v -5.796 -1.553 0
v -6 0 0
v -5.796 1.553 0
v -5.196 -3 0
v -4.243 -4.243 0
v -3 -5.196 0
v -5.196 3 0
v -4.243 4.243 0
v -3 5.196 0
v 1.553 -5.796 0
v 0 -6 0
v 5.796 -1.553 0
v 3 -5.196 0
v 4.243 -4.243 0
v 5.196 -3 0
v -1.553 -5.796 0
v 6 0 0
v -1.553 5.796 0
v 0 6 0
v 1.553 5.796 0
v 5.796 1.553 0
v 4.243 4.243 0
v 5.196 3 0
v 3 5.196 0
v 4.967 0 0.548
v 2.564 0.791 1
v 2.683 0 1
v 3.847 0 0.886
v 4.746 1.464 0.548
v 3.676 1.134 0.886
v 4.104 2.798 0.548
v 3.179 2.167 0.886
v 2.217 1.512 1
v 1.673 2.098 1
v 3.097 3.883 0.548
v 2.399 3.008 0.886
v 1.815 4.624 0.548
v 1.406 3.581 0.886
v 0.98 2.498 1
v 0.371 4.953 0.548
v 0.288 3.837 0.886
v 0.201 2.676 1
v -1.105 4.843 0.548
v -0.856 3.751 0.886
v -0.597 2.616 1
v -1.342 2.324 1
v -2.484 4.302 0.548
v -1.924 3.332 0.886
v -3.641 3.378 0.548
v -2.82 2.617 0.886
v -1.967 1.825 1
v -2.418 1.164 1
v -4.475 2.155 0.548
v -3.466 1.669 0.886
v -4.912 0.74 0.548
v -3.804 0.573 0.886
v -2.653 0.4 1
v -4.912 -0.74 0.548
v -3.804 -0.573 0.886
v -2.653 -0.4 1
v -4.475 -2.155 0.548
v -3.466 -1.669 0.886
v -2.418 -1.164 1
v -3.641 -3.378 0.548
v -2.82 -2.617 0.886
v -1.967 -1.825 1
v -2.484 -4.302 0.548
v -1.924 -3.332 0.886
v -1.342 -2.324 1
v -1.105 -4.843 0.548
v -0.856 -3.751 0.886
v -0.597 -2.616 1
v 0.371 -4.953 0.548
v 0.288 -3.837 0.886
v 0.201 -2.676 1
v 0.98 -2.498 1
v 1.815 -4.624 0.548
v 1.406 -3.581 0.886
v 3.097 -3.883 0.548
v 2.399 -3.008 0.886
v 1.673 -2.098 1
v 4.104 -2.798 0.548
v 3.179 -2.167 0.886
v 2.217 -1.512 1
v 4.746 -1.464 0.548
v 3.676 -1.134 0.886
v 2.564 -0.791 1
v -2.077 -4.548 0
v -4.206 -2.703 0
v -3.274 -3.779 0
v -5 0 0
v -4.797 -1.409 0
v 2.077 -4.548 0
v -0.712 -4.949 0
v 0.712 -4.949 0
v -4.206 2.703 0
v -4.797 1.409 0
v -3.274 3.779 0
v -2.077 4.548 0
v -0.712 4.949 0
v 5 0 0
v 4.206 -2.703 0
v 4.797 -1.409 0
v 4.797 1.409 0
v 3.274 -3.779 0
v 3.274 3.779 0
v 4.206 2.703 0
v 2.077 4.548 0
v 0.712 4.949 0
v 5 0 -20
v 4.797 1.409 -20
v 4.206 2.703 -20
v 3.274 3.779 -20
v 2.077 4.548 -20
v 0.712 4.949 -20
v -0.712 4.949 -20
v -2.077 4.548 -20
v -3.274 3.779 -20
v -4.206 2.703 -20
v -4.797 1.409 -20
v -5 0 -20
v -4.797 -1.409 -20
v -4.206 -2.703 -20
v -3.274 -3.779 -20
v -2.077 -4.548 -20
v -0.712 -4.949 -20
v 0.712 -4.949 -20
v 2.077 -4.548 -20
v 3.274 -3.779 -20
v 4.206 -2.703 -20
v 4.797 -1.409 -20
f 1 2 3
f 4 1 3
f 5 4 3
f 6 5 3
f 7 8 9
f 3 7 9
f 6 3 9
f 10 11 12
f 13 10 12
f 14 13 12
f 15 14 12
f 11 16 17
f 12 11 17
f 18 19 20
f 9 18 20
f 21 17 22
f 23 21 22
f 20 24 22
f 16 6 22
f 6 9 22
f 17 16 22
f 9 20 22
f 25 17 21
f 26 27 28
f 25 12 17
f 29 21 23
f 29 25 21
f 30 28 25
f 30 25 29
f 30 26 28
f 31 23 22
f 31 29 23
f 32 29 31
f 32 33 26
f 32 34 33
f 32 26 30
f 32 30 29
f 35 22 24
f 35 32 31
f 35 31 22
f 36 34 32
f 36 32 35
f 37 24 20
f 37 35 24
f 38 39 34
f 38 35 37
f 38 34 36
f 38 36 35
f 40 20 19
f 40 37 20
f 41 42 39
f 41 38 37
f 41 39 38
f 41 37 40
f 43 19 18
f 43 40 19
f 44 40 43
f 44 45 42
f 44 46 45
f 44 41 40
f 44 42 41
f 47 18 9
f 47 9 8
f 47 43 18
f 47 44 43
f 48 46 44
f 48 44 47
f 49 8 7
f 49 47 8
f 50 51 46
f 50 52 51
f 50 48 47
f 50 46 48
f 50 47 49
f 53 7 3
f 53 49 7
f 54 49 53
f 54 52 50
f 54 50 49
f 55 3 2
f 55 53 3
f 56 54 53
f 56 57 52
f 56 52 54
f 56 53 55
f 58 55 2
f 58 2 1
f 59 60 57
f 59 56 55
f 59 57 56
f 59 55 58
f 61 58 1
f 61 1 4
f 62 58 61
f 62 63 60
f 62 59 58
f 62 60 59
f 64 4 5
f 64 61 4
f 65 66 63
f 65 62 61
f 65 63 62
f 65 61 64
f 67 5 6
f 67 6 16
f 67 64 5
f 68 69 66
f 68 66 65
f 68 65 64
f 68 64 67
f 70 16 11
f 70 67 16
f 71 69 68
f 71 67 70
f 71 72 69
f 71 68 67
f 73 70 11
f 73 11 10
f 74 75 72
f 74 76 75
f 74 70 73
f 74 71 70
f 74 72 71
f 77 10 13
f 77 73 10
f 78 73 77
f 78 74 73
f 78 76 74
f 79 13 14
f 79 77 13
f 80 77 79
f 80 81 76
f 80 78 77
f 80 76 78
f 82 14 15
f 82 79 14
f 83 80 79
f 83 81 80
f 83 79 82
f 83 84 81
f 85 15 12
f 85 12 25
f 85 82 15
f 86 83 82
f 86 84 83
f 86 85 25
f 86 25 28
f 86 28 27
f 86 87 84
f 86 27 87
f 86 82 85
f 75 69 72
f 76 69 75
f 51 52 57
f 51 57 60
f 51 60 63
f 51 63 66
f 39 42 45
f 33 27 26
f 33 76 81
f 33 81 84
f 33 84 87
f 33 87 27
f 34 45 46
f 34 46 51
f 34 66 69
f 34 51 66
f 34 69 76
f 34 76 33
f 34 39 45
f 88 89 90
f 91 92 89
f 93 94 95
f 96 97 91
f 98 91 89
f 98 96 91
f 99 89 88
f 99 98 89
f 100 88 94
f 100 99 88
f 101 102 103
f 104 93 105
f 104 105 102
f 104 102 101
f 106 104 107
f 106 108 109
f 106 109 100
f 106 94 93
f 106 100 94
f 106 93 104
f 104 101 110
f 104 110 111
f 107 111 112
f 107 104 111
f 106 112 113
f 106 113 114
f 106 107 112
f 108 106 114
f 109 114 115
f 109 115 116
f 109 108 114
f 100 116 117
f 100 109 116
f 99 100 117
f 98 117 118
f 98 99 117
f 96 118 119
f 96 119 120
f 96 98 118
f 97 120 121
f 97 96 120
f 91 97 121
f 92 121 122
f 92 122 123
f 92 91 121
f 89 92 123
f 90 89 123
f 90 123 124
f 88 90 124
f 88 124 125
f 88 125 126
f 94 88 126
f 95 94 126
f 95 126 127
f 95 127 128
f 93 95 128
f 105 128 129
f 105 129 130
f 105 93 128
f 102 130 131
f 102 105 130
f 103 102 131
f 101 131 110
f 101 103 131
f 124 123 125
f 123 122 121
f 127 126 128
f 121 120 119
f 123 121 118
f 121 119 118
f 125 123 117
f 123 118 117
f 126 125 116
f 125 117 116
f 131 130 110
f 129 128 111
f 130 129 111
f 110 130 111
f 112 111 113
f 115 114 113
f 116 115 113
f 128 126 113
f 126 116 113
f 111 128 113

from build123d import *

# Parameters (mm, degrees)
SKETCH1_R           = 5
BOSS_EXTRUDE2_DEPTH = 20
SKETCH1_4_R         = 6
BOSS_EXTRUDE3_DEPTH = 1
FILLET1_R           = 6


with BuildPart() as part:
    # Sketch1 → Boss-Extrude2 (new body)
    with BuildSketch(Plane.XY):
        Circle(SKETCH1_R)
    extrude(amount=-BOSS_EXTRUDE2_DEPTH)


with BuildPart() as body_2:
    # Sketch1<4> → Boss-Extrude3 (new body)
    with BuildSketch(Plane.XY):
        Circle(SKETCH1_4_R)
    extrude(amount=BOSS_EXTRUDE3_DEPTH)

    # Fillet1
    # the kernel refuses this fillet: 6 mm, written as the material it takes off along each edge
    with BuildSketch(Plane(origin=(0, 0, 1), x_dir=(1, 0, 0), z_dir=(0, -1, 0))) as fillet1_piece_1:
        with BuildLine():
            CenterArc((2.68337521, -6), FILLET1_R, 56.442690238, 33.557309762)
            Line((2.68337521, 0), (2.68337521, 0.12))
            Line((2.68337521, 0.12), (6, 0.12))
            Line((6, 0.12), (6.12, 0))
            ThreePointArc((6.12, 0), (6.12, -0.5), (6.066332496, -0.9))
            Line((6.066332496, -0.9), (6, -1))
        make_face()
    revolve(axis=Axis((0, 0, 1), (0, 0, 1)), mode=Mode.SUBTRACT)


solid = Compound([part.part, body_2.part])
